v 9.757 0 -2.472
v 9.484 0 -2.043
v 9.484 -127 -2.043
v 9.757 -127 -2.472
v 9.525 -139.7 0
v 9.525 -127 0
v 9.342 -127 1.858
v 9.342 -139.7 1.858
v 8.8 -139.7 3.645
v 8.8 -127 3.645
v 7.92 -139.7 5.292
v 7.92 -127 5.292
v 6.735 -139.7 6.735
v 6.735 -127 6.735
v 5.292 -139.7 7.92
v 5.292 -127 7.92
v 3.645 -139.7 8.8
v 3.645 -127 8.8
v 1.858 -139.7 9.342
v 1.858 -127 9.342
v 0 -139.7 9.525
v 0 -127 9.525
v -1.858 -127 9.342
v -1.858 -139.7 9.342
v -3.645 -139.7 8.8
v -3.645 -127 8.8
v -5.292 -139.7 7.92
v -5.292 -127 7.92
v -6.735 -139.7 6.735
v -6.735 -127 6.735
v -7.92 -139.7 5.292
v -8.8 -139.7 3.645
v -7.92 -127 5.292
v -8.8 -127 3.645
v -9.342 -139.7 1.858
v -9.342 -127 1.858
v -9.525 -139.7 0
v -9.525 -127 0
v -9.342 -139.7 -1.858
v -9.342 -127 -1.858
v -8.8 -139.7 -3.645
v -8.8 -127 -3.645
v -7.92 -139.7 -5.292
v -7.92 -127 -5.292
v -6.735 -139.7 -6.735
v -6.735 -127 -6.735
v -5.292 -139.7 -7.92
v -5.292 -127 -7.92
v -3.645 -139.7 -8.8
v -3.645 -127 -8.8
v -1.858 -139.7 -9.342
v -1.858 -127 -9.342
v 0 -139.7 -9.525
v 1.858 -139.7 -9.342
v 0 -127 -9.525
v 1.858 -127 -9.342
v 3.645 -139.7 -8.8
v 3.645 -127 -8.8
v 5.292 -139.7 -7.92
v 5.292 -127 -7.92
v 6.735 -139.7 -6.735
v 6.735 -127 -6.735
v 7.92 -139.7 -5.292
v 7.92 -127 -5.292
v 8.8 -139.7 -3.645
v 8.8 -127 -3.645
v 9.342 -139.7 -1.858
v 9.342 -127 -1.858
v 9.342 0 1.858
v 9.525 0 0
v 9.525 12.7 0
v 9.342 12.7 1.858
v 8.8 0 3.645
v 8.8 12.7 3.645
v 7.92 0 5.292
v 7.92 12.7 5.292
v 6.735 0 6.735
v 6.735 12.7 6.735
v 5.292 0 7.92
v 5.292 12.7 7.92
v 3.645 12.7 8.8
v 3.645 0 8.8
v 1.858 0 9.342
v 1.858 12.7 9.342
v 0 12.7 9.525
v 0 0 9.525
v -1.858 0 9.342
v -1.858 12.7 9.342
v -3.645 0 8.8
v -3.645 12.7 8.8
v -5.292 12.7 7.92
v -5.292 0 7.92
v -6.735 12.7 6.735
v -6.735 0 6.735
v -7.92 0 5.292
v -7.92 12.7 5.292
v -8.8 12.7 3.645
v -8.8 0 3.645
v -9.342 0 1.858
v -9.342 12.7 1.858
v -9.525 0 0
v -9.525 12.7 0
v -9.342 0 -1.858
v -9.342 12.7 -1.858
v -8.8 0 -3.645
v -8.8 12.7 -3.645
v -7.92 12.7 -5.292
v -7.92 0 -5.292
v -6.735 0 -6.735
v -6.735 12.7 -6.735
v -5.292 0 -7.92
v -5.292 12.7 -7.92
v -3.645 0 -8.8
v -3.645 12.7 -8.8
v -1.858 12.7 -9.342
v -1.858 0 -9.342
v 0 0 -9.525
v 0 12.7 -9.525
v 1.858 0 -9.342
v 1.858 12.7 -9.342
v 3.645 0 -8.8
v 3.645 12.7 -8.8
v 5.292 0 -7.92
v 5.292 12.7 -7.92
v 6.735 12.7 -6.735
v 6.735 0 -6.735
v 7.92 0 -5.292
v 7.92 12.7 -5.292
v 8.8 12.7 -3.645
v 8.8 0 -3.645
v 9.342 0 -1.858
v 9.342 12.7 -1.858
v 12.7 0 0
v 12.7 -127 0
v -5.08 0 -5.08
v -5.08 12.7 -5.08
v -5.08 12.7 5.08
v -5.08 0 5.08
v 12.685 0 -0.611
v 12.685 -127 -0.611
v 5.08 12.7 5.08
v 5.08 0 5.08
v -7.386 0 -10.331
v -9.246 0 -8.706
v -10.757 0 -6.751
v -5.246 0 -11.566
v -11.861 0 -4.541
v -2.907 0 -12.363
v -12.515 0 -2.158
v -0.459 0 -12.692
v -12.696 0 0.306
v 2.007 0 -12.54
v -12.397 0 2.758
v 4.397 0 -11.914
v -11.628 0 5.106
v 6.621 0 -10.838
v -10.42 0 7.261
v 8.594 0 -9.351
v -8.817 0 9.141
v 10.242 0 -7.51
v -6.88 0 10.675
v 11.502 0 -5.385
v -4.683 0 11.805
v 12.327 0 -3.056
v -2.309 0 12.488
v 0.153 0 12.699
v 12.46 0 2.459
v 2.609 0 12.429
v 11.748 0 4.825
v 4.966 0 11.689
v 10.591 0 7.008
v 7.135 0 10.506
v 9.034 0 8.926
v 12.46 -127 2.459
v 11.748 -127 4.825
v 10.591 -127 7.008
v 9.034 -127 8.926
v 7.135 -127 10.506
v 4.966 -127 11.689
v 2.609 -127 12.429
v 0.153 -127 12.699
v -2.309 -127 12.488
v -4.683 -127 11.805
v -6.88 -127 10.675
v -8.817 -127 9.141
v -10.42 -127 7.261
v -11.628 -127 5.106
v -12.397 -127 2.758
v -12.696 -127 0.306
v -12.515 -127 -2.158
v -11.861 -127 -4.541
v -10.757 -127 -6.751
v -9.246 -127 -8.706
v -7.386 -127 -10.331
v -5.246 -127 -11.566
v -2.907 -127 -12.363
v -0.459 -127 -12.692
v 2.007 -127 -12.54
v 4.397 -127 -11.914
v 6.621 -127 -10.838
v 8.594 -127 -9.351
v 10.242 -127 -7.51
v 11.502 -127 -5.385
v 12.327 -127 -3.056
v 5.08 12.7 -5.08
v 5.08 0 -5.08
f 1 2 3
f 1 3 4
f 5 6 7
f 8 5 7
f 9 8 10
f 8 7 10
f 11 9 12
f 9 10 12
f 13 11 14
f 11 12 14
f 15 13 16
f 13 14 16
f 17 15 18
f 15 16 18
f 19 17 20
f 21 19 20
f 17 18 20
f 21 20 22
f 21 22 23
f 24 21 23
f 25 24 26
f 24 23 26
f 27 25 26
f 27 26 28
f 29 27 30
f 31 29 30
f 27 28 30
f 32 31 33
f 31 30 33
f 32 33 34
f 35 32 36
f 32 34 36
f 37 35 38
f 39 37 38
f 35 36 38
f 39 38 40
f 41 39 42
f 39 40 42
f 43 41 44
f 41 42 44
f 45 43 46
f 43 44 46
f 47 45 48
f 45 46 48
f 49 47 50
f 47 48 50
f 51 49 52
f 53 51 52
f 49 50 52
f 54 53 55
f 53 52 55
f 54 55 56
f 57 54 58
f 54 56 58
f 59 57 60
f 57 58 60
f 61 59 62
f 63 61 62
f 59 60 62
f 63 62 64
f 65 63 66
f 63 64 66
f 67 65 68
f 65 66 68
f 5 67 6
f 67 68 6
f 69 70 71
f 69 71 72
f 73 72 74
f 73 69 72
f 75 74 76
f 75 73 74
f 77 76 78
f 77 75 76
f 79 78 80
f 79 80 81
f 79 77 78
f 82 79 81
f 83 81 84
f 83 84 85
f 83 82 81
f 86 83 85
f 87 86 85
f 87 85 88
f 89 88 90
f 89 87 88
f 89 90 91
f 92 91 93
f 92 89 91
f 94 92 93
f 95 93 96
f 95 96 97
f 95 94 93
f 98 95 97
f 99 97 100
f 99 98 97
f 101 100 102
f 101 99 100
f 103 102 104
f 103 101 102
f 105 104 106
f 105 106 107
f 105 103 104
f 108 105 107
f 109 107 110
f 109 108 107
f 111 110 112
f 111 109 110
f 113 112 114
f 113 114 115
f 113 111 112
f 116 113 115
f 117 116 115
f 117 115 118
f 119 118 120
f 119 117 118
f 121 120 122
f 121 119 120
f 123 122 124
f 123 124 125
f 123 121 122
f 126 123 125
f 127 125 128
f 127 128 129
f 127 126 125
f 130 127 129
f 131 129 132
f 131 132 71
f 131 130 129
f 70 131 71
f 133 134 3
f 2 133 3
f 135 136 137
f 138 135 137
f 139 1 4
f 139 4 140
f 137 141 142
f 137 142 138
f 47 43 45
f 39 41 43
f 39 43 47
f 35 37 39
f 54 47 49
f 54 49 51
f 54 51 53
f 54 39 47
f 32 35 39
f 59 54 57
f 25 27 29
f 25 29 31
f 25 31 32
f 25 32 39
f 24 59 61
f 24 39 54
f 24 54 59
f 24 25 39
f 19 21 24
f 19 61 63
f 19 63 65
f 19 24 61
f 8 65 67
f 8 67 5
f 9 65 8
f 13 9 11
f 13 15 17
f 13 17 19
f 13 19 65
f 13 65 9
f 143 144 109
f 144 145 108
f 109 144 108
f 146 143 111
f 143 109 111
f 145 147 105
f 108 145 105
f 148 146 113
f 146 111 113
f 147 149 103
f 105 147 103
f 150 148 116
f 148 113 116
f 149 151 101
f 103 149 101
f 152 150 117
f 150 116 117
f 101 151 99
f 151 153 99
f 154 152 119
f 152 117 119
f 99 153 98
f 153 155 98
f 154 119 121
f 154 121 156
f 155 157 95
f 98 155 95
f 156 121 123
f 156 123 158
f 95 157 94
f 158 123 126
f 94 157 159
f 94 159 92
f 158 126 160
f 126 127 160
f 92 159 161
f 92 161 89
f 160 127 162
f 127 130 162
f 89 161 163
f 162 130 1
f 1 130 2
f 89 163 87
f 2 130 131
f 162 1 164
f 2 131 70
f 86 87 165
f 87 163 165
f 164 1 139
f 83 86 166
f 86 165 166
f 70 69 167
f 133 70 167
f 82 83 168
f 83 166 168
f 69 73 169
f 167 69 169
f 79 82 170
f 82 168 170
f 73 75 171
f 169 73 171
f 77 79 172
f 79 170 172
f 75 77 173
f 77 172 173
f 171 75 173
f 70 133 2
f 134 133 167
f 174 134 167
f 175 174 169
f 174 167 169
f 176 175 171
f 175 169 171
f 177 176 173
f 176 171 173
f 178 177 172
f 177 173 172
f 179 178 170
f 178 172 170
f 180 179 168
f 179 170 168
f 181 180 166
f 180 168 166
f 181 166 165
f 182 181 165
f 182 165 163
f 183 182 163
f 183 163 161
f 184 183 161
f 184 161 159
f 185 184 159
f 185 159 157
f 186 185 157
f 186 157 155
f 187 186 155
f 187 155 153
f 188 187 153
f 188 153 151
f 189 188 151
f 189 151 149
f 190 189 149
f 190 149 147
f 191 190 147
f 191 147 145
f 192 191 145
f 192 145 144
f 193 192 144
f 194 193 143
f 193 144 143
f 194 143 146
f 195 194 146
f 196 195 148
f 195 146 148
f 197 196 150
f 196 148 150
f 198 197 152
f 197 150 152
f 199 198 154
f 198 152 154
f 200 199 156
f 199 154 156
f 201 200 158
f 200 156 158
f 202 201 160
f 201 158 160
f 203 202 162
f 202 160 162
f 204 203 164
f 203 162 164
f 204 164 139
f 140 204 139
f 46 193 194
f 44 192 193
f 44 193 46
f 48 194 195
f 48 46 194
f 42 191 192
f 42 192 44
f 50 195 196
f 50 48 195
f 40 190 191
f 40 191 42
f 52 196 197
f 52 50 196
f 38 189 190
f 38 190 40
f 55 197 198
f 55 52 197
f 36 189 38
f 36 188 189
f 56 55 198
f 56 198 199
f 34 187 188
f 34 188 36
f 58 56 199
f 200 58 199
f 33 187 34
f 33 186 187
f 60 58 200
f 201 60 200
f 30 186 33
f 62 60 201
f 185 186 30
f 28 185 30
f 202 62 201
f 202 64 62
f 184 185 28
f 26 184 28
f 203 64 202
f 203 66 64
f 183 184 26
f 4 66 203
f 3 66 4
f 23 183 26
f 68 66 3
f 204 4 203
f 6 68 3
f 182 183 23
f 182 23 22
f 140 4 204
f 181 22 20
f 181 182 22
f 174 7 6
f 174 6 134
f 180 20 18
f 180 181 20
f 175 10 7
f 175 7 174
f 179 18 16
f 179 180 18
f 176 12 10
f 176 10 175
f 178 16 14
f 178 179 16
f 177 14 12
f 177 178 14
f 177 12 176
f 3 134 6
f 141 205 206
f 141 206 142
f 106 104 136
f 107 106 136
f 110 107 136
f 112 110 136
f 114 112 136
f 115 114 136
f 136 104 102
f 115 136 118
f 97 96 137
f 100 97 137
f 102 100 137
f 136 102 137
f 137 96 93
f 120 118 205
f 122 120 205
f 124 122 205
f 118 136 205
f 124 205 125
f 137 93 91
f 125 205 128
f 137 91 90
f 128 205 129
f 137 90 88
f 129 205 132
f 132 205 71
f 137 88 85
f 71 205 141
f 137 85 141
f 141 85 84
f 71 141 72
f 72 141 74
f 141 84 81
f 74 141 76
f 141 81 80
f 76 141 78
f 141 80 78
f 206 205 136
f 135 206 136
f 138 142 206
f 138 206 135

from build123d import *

# Parameters (mm, degrees)
F0_R     = 12.7
F0_R_2   = 9.525
F0_W     = 10.16
F0_H     = 10.16
F1_DEPTH = 127
F2_DEPTH = 12.7
F3_W     = 10.16
F3_H     = 10.16
F4_DEPTH = 12.7
F5_R     = 9.525
F6_DEPTH = 12.7
F8_DEPTH = 139.701


with BuildPart() as f1:
    # F0 (on Front) → F1 (new body)
    with BuildSketch(Plane.XZ):
        Circle(F0_R)
        Circle(F0_R_2, mode=Mode.SUBTRACT)
        Circle(F0_R_2)
        Rectangle(F0_W, F0_H, mode=Mode.SUBTRACT)
        Rectangle(F0_W, F0_H)
    extrude(amount=F1_DEPTH)

    # F0 (on Front) → F2 (join)
    with BuildSketch(Plane.XZ):
        Circle(F0_R_2)
        Rectangle(F0_W, F0_H, mode=Mode.SUBTRACT)
        Rectangle(F0_W, F0_H)
    extrude(amount=-F2_DEPTH)

    # F3 (on face) → F4 (cut)
    with BuildSketch(Plane(origin=(0, 12.7, 0), x_dir=(-1, 0, 0), z_dir=(0, 1, 0))):
        Rectangle(F3_W, F3_H)
    extrude(amount=-F4_DEPTH, mode=Mode.SUBTRACT)

    # F5 (on face) → F6 (join)
    with BuildSketch(Plane.XZ.offset(127)):
        Circle(F5_R)
    extrude(amount=F6_DEPTH)

    # F7 (on face) → F8 (cut, through all)
    with BuildSketch(Plane.XZ.offset(127)):
        Polygon((14.4898414551, 1.1373524412), (12.7, 0), (9.4843178079, -2.0434010961), (9.7567712874, -2.4721587217), (14.7622949346, 0.7085948155), align=None)
    extrude(amount=-F8_DEPTH, mode=Mode.SUBTRACT)


solid = f1.part
